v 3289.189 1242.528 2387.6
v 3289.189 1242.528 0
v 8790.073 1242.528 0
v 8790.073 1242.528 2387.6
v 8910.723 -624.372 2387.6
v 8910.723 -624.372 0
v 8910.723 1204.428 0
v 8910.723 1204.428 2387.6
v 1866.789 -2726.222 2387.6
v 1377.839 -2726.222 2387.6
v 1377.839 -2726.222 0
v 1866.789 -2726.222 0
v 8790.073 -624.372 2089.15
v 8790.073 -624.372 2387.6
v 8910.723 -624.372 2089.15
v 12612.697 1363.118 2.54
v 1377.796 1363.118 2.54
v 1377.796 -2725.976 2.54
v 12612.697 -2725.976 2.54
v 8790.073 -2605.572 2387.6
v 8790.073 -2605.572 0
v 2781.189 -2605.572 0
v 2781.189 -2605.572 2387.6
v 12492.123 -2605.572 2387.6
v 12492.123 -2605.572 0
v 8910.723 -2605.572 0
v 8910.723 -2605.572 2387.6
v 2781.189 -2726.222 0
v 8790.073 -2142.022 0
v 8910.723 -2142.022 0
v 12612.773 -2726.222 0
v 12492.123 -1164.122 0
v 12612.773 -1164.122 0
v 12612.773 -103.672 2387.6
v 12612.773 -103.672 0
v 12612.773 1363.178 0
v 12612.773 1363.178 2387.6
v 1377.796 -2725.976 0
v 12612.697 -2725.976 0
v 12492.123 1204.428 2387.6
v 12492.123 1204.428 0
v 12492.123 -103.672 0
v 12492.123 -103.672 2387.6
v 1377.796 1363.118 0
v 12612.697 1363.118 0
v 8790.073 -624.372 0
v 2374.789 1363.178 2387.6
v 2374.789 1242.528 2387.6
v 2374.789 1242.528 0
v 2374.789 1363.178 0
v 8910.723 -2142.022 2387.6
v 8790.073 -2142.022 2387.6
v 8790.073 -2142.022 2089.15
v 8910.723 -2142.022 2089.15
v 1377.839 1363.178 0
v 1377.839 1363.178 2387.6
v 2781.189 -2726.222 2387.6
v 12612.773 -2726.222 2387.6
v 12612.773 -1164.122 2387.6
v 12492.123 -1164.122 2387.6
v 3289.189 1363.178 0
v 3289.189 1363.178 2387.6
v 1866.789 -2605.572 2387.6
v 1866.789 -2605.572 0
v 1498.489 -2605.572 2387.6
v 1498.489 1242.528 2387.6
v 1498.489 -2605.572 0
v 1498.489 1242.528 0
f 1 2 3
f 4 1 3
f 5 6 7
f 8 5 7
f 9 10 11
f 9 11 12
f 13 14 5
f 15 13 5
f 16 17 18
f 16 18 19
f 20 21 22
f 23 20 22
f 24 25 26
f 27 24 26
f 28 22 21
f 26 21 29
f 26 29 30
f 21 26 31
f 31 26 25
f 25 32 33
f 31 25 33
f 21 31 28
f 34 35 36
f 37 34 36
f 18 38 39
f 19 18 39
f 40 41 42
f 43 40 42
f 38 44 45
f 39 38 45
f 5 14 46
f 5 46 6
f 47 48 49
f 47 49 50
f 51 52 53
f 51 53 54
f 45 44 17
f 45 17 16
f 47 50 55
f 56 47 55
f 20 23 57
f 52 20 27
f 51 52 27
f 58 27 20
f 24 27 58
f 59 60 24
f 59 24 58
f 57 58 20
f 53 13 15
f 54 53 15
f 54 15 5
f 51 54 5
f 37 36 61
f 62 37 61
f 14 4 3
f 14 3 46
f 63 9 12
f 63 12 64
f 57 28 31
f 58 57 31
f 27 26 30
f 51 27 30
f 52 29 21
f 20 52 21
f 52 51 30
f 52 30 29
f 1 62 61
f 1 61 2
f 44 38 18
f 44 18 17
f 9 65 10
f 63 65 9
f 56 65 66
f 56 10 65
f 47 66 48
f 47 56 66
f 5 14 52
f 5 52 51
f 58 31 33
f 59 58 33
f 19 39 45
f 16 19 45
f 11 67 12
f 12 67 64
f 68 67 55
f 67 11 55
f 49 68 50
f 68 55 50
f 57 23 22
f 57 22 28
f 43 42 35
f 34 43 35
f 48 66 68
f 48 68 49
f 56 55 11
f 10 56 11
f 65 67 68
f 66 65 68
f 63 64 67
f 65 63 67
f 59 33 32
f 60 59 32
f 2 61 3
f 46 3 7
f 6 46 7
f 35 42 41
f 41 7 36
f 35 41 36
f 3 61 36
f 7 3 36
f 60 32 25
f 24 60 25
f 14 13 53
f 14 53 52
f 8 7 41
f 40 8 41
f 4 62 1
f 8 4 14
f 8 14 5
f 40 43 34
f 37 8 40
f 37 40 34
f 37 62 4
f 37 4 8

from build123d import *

# Parameters (mm, degrees)
F1_DEPTH = 2387.6
F2_W     = 11234.900356
F2_H     = 4089.0944
F3_DEPTH = 2.54
F4_W     = 120.65
F4_H     = 298.45
F5_DEPTH = 1517.65


with BuildPart() as f1:
    # F0 (on Top) → F1 (new body)
    with BuildSketch(Plane.XY):
        Polygon((1498.488612, -2605.572111), (1498.488612, 1242.527889), (2374.788612, 1242.527889), (2374.788612, 1363.177889), (1377.838612, 1363.177889), (1377.838612, -2726.222111), (1866.788612, -2726.222111), (1866.788612, -2605.572111), align=None)
        Polygon((12492.122546, -1164.122111), (12492.122546, -2605.572111), (8910.722546, -2605.572111), (8910.722546, -2142.022111), (8790.072546, -2142.022111), (8790.072546, -2605.572111), (2781.188612, -2605.572111), (2781.188612, -2726.222111), (12612.772546, -2726.222111), (12612.772546, -1164.122111), align=None)
        Polygon((3289.188612, 1242.527889), (8790.072546, 1242.527889), (8790.072546, -624.372111), (8910.722546, -624.372111), (8910.722546, 1204.427889), (12492.122546, 1204.427889), (12492.122546, -103.672111), (12612.772546, -103.672111), (12612.772546, 1363.177889), (3289.188612, 1363.177889), align=None)
    extrude(amount=F1_DEPTH)


with BuildPart() as f3:
    # F2 (on Top) → F3 (new body)
    with BuildSketch(Plane.XY):
        with Locations((6995.24647, -681.429267)):
            Rectangle(F2_W, F2_H)
    extrude(amount=F3_DEPTH)


with BuildPart() as f5:
    # F4 (on face) → F5 (new body, through all)
    with BuildSketch(Plane.XZ.offset(624.372111)):
        with Locations((8850.397546, 2238.375)):
            Rectangle(F4_W, F4_H)
    extrude(amount=F5_DEPTH)


solid = Compound([f1.part, f3.part, f5.part])
